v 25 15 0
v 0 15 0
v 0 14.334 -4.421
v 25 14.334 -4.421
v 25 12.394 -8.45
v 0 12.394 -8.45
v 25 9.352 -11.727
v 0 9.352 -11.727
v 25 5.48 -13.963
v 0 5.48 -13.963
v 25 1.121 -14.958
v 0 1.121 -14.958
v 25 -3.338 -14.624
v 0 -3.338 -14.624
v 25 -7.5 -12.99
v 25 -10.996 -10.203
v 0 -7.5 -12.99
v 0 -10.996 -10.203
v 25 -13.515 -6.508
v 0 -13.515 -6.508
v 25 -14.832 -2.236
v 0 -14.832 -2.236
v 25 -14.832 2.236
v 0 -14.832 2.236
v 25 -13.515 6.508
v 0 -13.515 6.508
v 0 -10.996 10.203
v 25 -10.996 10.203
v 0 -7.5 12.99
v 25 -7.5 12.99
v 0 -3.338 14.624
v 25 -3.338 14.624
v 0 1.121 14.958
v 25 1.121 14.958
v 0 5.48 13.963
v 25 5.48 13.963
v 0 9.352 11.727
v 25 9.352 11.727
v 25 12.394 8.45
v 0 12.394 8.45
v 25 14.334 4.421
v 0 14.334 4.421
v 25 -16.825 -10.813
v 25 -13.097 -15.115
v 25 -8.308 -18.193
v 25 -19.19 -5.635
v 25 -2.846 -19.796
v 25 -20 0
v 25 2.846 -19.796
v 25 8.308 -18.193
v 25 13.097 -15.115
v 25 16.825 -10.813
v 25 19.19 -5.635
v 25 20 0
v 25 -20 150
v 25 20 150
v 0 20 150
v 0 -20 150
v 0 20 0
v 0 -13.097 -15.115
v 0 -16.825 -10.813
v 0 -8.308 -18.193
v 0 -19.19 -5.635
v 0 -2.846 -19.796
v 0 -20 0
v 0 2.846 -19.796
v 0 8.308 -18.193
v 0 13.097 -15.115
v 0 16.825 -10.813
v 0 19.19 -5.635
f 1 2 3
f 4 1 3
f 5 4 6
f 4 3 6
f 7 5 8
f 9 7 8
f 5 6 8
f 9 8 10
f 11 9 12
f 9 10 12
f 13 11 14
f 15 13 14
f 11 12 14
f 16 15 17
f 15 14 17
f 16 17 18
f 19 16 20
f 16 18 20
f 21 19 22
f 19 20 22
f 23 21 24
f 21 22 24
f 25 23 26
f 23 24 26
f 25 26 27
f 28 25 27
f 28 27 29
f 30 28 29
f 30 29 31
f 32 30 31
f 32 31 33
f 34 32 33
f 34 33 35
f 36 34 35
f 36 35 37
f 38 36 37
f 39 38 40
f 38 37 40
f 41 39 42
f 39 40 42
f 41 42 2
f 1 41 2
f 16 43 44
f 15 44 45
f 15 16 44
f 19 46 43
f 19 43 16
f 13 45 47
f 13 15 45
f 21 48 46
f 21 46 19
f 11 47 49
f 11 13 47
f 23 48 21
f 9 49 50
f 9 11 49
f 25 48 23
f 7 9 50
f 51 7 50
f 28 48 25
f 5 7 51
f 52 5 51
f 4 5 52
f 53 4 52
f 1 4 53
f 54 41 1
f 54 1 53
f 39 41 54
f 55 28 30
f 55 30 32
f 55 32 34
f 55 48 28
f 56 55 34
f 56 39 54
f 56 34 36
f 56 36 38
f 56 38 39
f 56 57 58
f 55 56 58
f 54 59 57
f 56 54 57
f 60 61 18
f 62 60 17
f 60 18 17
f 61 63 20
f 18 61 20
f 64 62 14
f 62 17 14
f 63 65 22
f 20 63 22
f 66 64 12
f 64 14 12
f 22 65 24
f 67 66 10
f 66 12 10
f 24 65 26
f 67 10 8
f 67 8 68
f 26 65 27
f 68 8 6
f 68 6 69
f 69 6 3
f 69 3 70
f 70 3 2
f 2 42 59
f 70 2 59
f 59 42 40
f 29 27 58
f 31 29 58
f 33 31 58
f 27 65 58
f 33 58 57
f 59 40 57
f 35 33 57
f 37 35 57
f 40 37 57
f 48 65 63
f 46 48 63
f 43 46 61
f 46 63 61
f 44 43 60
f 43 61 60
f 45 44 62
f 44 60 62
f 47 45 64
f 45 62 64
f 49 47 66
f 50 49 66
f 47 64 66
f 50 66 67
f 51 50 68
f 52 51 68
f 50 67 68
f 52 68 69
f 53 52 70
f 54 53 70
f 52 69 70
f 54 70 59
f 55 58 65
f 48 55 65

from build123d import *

# Parameters (mm, degrees)
F1_DEPTH = 25


with BuildPart() as f1:
    # F0 (on Right) → F1 (new body)
    with BuildSketch(Plane.YZ):
        with BuildLine():
            ThreePointArc((-15, 0), (0, 15), (15, 0))
            Line((15, 0), (20, 0))
            ThreePointArc((20, 0), (0, 20), (-20, 0))
            Line((-20, 0), (-15, 0))
        make_face()
        with BuildLine():
            Line((20, 0), (15, 0))
            ThreePointArc((15, 0), (0, -15), (-15, 0))
            Line((-15, 0), (-20, 0))
            ThreePointArc((-20, 0), (0, -20), (20, 0))
        make_face()
        with BuildLine():
            ThreePointArc((-20, 0), (0, 20), (20, 0))
            Line((20, 0), (20, 150))
            Line((20, 150), (-20, 150))
            Line((-20, 150), (-20, 0))
        make_face()
    extrude(amount=F1_DEPTH)


solid = f1.part
